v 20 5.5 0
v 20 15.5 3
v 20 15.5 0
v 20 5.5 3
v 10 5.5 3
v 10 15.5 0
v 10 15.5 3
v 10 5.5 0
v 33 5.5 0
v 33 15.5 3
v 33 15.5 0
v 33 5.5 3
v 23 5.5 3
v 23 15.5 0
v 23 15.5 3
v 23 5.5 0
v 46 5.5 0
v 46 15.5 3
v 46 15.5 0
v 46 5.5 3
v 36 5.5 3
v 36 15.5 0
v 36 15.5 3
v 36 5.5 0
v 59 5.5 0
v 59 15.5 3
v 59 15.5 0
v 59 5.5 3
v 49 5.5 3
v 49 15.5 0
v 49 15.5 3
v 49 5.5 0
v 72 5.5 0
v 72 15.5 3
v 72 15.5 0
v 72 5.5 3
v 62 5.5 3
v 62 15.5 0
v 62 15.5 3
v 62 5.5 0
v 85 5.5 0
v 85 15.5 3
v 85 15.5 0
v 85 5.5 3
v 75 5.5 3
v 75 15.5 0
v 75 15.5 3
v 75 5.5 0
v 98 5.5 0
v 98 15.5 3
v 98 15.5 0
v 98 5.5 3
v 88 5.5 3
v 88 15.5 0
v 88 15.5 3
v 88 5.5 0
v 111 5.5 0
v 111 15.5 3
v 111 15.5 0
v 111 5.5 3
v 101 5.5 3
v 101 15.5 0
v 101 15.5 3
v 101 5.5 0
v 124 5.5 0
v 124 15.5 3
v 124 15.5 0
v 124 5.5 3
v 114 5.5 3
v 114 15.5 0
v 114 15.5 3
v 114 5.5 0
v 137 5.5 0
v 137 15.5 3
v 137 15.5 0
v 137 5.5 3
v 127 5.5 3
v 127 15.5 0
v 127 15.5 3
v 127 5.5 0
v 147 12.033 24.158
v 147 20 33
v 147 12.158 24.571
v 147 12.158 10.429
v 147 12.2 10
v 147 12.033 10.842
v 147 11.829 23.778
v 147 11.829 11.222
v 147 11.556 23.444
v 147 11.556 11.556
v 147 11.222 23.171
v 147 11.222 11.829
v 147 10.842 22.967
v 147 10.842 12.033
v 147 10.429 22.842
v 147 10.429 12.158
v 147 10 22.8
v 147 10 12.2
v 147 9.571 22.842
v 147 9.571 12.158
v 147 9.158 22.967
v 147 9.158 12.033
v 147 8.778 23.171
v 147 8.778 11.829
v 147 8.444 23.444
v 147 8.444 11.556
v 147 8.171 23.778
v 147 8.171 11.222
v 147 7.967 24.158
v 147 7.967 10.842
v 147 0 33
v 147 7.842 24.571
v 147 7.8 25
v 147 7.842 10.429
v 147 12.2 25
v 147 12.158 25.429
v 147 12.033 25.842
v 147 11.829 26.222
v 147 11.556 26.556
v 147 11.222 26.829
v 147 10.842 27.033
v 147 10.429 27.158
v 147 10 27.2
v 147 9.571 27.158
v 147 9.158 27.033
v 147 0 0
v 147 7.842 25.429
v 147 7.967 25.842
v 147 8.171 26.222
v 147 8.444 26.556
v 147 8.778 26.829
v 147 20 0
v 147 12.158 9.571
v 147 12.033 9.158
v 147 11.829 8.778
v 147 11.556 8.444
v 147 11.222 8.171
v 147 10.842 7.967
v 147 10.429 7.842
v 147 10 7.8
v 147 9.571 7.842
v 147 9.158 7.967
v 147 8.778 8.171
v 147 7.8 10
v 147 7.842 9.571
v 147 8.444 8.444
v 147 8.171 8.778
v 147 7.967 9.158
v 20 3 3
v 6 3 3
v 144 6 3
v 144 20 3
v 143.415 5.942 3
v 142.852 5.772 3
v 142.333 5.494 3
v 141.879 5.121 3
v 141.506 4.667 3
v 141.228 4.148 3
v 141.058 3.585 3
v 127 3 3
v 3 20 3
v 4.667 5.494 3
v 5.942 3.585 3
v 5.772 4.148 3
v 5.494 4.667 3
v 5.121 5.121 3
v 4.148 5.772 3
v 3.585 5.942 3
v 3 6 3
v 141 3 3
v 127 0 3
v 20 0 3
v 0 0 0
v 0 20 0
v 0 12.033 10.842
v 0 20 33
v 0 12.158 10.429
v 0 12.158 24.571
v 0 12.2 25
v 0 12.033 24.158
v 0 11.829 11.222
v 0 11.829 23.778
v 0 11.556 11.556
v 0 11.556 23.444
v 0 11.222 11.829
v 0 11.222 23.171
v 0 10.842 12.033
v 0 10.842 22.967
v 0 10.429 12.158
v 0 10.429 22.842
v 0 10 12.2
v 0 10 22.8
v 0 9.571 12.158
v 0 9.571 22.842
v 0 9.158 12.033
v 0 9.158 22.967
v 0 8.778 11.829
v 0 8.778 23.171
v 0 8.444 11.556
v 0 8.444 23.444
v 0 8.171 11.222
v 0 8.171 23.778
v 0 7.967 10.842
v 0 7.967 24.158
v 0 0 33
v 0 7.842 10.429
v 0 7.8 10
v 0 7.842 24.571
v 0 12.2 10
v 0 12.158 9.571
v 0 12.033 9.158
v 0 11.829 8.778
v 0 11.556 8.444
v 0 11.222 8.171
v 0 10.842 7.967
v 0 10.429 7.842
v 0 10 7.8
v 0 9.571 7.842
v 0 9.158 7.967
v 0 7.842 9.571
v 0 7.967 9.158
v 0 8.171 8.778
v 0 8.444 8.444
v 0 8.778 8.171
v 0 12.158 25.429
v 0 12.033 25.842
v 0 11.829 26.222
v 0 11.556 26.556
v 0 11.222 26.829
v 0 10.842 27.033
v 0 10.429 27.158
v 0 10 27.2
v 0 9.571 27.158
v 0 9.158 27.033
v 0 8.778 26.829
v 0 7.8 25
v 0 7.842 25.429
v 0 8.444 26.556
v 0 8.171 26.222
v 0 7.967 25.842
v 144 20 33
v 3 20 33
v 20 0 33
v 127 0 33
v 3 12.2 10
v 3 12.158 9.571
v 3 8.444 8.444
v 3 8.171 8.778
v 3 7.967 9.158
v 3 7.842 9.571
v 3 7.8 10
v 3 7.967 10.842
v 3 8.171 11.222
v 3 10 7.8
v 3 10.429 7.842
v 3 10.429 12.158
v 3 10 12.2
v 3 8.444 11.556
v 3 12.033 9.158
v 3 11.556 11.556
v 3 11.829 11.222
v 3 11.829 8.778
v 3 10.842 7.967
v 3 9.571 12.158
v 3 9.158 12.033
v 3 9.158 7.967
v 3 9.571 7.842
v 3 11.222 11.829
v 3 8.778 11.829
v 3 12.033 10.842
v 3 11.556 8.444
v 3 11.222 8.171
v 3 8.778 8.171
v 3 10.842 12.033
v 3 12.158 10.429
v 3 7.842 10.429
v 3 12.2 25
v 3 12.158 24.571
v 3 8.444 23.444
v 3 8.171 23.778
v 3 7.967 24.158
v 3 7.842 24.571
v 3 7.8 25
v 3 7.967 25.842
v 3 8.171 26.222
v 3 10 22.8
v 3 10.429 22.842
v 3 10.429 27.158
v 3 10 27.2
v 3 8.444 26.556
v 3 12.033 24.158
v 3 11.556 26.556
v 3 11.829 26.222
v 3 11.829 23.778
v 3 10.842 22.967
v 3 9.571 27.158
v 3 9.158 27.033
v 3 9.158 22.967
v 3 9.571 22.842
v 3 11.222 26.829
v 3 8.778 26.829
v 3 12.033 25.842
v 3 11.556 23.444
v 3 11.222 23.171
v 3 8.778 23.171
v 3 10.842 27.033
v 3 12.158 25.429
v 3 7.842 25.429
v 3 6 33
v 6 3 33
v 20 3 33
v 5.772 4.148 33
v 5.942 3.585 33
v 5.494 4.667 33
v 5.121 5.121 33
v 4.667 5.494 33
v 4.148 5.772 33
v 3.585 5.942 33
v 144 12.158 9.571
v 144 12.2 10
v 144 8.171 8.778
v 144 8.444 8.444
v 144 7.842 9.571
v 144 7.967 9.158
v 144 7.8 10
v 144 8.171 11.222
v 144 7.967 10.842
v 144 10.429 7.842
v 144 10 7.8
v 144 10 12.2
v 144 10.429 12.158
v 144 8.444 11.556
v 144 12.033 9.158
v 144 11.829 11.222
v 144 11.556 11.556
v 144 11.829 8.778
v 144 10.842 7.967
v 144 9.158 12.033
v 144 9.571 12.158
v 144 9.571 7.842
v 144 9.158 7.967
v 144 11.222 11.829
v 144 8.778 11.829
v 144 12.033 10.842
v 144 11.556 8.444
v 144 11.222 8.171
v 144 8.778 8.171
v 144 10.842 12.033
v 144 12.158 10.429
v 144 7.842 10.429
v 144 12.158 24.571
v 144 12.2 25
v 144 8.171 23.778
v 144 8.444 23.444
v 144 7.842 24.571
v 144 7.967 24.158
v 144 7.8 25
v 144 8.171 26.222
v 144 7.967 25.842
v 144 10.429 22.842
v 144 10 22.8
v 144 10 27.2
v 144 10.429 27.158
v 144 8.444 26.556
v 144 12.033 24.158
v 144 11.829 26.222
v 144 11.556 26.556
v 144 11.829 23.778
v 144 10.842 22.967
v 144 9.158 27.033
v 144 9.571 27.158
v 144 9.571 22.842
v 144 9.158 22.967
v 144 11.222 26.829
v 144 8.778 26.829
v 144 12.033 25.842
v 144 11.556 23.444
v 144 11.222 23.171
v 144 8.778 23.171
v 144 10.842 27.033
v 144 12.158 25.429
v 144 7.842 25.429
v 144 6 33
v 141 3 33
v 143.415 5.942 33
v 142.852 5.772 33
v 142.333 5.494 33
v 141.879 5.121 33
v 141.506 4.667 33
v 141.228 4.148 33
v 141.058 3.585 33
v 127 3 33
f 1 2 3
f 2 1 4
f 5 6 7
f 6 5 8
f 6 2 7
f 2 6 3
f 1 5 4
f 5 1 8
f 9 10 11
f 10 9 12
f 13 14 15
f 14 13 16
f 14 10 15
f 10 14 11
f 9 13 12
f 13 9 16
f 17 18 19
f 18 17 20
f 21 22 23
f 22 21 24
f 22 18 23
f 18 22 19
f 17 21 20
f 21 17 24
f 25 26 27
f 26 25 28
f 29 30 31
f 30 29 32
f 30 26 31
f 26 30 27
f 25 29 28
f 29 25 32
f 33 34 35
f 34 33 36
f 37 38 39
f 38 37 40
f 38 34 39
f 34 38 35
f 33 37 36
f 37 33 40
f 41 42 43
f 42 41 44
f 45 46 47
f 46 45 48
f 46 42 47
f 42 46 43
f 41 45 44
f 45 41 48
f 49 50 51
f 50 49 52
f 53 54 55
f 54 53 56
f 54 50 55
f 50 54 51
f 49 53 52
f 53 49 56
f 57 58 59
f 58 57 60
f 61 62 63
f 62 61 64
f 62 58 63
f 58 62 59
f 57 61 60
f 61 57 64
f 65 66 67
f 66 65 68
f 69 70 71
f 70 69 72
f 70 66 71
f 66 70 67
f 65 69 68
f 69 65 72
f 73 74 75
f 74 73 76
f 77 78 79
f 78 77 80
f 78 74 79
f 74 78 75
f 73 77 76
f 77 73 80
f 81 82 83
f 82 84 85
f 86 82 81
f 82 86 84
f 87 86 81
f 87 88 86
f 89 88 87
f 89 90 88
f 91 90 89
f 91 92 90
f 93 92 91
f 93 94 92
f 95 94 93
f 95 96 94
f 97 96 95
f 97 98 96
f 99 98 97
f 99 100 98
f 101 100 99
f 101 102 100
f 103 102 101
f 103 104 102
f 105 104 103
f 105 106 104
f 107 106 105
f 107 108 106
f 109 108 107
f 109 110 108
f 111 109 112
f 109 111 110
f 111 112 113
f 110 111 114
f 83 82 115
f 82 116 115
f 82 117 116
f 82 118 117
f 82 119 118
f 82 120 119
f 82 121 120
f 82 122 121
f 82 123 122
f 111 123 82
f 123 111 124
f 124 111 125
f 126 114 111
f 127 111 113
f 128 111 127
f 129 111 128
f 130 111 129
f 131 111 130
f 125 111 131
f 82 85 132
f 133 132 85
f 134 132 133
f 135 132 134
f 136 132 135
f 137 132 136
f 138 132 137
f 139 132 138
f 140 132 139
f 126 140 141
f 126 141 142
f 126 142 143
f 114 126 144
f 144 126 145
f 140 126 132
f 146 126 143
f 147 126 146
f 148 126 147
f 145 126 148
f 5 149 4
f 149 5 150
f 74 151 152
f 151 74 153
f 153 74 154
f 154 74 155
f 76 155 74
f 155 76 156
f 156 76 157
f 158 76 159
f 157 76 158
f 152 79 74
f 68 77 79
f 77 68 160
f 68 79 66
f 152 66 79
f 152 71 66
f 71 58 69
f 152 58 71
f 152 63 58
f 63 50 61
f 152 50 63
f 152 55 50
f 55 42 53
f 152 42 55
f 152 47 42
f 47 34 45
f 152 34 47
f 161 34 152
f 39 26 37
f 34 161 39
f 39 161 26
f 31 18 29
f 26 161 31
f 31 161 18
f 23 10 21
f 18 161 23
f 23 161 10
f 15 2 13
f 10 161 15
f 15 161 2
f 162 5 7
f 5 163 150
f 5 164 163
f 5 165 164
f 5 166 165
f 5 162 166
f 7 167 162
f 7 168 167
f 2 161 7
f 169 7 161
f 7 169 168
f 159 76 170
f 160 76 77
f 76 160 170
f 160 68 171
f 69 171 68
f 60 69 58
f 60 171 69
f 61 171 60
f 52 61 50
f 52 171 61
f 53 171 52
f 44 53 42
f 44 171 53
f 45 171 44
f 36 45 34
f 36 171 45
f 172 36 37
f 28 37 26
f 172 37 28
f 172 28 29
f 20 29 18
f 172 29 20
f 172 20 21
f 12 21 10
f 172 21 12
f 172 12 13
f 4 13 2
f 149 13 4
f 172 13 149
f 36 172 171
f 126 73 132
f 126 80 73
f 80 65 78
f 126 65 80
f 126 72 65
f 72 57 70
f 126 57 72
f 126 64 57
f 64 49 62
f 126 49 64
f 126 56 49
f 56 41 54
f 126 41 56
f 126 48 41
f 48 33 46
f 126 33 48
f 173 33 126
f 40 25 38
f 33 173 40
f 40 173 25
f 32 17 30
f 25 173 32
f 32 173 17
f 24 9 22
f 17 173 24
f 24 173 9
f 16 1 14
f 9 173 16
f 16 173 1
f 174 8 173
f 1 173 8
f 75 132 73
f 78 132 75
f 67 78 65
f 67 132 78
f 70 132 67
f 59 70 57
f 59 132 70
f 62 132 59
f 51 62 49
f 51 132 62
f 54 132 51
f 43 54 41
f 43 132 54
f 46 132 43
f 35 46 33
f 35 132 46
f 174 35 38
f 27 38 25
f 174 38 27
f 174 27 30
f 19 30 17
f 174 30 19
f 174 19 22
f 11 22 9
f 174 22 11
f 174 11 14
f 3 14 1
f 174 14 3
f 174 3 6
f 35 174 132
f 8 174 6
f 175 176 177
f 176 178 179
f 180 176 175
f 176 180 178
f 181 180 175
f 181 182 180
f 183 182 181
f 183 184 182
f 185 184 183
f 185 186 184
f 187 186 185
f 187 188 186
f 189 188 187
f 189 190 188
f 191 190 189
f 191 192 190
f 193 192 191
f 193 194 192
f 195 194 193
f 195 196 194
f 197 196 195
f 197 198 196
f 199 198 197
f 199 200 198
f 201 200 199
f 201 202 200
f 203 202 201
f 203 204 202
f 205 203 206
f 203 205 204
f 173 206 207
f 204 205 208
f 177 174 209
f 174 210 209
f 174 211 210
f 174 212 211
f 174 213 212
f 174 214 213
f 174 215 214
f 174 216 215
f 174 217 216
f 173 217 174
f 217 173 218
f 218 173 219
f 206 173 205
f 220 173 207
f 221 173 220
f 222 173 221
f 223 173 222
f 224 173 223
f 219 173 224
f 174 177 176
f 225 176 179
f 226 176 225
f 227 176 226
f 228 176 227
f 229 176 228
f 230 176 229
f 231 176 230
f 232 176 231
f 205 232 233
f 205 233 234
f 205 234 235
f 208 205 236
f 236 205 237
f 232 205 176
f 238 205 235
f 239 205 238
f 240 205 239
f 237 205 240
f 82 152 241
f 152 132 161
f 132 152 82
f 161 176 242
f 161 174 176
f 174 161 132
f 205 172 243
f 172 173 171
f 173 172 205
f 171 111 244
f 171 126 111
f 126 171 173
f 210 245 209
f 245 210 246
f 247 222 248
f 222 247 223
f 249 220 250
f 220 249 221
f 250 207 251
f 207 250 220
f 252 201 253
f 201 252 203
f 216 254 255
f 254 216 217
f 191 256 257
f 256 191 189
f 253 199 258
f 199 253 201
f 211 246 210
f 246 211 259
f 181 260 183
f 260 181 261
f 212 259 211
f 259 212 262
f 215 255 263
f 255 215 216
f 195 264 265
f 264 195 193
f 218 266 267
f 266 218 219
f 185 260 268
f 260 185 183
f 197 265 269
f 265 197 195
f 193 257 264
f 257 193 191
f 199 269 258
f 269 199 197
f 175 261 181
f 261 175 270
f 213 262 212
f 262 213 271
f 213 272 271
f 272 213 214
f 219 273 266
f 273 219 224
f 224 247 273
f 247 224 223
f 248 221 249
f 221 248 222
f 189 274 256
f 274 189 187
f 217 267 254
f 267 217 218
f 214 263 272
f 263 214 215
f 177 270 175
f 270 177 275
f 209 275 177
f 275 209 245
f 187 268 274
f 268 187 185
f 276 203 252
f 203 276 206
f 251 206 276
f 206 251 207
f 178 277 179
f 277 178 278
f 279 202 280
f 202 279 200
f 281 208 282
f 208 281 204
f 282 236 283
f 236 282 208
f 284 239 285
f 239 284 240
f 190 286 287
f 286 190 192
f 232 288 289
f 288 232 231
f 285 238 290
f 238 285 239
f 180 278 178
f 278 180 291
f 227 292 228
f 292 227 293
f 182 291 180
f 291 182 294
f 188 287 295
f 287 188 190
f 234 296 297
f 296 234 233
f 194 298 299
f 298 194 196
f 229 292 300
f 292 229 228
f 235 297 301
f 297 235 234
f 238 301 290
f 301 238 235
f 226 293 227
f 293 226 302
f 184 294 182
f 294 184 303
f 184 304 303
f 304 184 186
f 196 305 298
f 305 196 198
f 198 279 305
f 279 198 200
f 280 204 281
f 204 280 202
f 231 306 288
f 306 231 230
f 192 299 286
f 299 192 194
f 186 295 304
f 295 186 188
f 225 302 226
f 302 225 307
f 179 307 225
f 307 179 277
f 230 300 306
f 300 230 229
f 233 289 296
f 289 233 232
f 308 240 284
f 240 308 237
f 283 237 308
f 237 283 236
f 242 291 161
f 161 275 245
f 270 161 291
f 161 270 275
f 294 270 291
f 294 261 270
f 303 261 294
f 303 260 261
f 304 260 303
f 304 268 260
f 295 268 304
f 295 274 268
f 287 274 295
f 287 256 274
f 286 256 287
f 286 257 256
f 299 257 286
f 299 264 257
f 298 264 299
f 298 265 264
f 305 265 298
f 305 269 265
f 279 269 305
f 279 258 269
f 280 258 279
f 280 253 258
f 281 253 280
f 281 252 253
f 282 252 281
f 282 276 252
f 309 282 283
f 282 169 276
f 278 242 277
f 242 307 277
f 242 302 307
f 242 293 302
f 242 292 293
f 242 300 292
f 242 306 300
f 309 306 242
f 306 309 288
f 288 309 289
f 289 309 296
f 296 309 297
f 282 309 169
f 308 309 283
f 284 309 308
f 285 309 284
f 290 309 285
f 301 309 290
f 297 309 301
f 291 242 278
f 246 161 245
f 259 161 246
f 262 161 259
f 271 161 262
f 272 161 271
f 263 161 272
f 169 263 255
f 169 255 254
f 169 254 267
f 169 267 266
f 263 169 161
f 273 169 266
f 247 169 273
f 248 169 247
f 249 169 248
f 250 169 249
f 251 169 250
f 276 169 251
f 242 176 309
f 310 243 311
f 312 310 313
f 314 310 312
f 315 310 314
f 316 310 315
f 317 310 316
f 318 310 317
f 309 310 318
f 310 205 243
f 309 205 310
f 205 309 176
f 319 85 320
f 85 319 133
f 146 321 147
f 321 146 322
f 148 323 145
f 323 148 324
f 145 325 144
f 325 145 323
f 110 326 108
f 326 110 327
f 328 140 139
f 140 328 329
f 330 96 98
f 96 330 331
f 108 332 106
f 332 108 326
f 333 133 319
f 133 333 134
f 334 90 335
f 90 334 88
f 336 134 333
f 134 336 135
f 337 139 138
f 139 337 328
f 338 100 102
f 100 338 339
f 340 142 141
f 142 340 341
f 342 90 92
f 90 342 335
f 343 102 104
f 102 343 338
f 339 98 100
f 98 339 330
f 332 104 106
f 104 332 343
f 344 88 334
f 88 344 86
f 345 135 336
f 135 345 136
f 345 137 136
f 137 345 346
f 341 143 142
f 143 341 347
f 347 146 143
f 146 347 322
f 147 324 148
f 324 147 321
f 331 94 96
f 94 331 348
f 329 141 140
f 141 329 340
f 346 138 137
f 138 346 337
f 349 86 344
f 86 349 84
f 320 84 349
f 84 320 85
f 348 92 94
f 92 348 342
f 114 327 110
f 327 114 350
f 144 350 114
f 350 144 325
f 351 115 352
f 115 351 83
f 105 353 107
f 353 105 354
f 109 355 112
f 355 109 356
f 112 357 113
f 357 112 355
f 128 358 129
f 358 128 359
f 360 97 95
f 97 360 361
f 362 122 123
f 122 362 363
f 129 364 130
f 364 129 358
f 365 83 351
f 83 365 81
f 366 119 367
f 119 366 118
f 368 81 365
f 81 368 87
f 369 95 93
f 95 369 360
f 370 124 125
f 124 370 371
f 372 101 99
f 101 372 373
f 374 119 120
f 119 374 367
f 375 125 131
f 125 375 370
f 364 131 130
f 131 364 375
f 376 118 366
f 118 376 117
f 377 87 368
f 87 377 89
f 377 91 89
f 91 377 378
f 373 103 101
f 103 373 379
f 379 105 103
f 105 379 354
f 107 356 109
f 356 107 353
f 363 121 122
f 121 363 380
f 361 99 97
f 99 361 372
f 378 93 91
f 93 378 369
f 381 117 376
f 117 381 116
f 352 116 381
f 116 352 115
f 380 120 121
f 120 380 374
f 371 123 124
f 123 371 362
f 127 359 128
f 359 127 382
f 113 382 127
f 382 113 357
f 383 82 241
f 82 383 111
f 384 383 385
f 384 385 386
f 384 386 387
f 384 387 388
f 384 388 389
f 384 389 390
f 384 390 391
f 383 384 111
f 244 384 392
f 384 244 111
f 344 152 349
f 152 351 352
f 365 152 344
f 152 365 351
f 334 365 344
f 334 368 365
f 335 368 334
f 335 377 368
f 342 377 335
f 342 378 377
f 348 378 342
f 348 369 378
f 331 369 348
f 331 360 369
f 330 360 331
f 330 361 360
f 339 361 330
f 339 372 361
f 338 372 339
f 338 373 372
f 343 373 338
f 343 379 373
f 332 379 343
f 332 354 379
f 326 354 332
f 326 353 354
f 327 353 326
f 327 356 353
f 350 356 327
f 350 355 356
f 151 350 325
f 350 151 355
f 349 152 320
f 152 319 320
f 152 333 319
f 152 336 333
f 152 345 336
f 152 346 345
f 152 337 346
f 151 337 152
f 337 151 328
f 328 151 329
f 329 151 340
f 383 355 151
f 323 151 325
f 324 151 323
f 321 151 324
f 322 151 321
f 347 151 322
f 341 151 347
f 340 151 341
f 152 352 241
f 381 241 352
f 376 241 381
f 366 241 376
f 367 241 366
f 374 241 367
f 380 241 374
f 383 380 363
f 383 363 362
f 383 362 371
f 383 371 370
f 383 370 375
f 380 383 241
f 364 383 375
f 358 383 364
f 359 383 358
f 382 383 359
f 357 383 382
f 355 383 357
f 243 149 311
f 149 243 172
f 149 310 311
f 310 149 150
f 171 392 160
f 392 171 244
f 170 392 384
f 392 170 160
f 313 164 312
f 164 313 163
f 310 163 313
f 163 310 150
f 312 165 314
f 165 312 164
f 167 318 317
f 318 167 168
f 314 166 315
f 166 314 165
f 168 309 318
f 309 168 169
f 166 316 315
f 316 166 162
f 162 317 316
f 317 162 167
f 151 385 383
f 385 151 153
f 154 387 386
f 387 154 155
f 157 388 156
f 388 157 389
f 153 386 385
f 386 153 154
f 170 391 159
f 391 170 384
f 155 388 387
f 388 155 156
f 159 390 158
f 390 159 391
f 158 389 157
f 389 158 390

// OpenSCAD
$fn=32;
module cutouts(){
translate([0,5.5,-1])
cube([10,10,5]);
translate([13,5.5,-1])
cube([10,10,5]);
translate([26,5.5,-1])
cube([10,10,5]);
translate([39,5.5,-1])
cube([10,10,5]);
translate([52,5.5,-1])
cube([10,10,5]);
translate([65,5.5,-1])
cube([10,10,5]);
translate([78,5.5,-1])
cube([10,10,5]);
translate([91,5.5,-1])
cube([10,10,5]);
translate([104,5.5,-1])
cube([10,10,5]);
translate([117,5.5,-1])
cube([10,10,5]);
}
module bolthole(){
rotate([0,90,0])
cylinder(d=4.4, h=5);

translate([0,0,15])
rotate([0,90,0])
cylinder(d=4.4, h=5);
}

difference(){
cube([147,20,3]);
translate([10,0,0])
cutouts();
}
difference(){
cube([3,20,33]);
translate([-1,10,10])
bolthole();
}
cube([20,3,33]);
difference(){
translate([144,0,0])
cube([3,20,33]);
translate([143,10,10])
bolthole();
}
translate([127,0,0])
cube([20,3,33]);

translate([3,3,0])
cylinder(d=6,h=33);
translate([144,3,0])
cylinder(d=6,h=33);
